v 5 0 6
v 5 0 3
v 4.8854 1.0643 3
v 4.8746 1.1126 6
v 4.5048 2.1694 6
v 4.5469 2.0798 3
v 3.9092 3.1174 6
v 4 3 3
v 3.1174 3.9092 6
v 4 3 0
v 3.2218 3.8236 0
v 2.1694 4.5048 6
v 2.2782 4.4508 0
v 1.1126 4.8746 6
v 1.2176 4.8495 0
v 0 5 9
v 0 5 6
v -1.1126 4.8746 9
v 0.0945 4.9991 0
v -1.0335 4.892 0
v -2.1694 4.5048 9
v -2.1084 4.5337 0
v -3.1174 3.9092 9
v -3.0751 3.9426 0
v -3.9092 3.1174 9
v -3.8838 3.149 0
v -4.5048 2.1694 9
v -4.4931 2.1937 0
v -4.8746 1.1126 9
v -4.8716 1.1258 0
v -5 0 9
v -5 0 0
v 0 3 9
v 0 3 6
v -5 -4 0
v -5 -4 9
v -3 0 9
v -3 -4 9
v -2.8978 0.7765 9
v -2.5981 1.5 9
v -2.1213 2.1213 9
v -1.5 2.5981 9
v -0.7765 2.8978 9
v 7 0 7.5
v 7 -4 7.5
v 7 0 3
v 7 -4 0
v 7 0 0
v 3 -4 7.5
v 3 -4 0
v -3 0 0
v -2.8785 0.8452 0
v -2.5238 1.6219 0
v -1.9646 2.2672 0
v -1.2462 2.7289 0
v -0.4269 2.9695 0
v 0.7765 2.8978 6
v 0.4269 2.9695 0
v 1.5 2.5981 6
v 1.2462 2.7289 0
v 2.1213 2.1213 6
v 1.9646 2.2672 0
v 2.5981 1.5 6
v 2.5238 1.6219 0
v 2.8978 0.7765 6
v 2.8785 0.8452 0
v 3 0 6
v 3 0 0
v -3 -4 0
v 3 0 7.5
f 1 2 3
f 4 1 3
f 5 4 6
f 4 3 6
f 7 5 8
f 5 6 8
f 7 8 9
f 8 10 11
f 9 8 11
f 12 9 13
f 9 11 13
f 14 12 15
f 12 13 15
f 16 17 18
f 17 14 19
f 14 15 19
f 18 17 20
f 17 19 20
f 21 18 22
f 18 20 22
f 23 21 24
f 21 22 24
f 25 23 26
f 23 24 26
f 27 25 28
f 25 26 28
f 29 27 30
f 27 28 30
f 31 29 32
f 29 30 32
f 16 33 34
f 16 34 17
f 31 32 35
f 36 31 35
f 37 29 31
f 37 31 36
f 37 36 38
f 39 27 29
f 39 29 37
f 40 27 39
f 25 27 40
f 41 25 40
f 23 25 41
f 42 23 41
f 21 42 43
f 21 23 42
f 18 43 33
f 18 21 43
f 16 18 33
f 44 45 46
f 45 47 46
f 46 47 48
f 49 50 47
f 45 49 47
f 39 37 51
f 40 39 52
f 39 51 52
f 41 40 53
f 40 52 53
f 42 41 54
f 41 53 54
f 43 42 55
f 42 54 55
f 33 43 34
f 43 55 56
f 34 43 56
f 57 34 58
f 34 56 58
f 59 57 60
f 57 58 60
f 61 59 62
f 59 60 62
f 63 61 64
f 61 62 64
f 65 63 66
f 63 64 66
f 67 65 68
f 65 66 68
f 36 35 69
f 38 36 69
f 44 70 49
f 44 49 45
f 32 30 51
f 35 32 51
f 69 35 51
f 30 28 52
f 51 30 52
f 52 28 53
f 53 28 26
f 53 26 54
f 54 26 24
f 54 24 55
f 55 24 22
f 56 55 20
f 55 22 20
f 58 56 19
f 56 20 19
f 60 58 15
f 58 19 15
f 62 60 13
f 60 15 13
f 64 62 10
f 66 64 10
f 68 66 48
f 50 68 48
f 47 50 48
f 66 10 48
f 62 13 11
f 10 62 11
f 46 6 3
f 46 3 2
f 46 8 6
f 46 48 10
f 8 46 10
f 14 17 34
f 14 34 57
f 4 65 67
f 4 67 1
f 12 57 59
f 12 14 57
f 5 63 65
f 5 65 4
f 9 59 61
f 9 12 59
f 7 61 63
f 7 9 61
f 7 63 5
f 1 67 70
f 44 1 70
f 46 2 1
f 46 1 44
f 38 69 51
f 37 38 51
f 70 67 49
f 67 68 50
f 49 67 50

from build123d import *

# Parameters (mm, degrees)
BOSS_EXTRUDE1_DEPTH = 9
SKETCH2_W           = 5
SKETCH2_H           = 9
CUT_EXTRUDE1_DEPTH  = 3
BOSS_EXTRUDE2_DEPTH = 3
SKETCH4_W           = 4
SKETCH4_H           = 4
BOSS_EXTRUDE3_DEPTH = 4.5


with BuildPart() as part:
    # Sketch1 → Boss-Extrude1 (new body)
    with BuildSketch(Plane.XY):
        with BuildLine():
            Line((3, 0), (3, -4))
            Line((3, -4), (5, -4))
            Line((5, -4), (5, 0))
            ThreePointArc((5, 0), (0, 5), (-5, 0))
            Line((-5, 0), (-5, -4))
            Line((-5, -4), (-3, -4))
            Line((-3, -4), (-3, 0))
            ThreePointArc((-3, 0), (0, 3), (3, 0))
        make_face()
    extrude(amount=BOSS_EXTRUDE1_DEPTH)

    # Sketch2 → Cut-Extrude1 (cut)
    with BuildSketch(Plane.XY.offset(9)):
        with Locations((2.5, 0.5)):
            Rectangle(SKETCH2_W, SKETCH2_H)
    extrude(amount=-CUT_EXTRUDE1_DEPTH, mode=Mode.SUBTRACT)



with BuildPart() as body_2:
    # Sketch3 → Boss-Extrude2 (new body)
    with BuildSketch(Plane(origin=(0, 0, 0), x_dir=(-1, 0, 0), z_dir=(0, 0, -1))):
        with BuildLine():
            Line((-5, -4), (-7, -4))
            Line((-7, -4), (-7, 0))
            Line((-7, 0), (-4, 3))
            ThreePointArc((-4, 3), (-4.74341649, 1.58113883), (-5, 0))
            Line((-5, 0), (-5, -4))
        make_face()
    extrude(amount=-BOSS_EXTRUDE2_DEPTH)


with BuildPart() as part_1:
    add(part.part)

    add(body_2.part)  # Boss-Extrude3 merges body 2
    # Sketch4 → Boss-Extrude3 (add)
    with BuildSketch(Plane.XY.offset(3)):
        with Locations((5, -2)):
            Rectangle(SKETCH4_W, SKETCH4_H)
    extrude(amount=BOSS_EXTRUDE3_DEPTH)


solid = part_1.part
